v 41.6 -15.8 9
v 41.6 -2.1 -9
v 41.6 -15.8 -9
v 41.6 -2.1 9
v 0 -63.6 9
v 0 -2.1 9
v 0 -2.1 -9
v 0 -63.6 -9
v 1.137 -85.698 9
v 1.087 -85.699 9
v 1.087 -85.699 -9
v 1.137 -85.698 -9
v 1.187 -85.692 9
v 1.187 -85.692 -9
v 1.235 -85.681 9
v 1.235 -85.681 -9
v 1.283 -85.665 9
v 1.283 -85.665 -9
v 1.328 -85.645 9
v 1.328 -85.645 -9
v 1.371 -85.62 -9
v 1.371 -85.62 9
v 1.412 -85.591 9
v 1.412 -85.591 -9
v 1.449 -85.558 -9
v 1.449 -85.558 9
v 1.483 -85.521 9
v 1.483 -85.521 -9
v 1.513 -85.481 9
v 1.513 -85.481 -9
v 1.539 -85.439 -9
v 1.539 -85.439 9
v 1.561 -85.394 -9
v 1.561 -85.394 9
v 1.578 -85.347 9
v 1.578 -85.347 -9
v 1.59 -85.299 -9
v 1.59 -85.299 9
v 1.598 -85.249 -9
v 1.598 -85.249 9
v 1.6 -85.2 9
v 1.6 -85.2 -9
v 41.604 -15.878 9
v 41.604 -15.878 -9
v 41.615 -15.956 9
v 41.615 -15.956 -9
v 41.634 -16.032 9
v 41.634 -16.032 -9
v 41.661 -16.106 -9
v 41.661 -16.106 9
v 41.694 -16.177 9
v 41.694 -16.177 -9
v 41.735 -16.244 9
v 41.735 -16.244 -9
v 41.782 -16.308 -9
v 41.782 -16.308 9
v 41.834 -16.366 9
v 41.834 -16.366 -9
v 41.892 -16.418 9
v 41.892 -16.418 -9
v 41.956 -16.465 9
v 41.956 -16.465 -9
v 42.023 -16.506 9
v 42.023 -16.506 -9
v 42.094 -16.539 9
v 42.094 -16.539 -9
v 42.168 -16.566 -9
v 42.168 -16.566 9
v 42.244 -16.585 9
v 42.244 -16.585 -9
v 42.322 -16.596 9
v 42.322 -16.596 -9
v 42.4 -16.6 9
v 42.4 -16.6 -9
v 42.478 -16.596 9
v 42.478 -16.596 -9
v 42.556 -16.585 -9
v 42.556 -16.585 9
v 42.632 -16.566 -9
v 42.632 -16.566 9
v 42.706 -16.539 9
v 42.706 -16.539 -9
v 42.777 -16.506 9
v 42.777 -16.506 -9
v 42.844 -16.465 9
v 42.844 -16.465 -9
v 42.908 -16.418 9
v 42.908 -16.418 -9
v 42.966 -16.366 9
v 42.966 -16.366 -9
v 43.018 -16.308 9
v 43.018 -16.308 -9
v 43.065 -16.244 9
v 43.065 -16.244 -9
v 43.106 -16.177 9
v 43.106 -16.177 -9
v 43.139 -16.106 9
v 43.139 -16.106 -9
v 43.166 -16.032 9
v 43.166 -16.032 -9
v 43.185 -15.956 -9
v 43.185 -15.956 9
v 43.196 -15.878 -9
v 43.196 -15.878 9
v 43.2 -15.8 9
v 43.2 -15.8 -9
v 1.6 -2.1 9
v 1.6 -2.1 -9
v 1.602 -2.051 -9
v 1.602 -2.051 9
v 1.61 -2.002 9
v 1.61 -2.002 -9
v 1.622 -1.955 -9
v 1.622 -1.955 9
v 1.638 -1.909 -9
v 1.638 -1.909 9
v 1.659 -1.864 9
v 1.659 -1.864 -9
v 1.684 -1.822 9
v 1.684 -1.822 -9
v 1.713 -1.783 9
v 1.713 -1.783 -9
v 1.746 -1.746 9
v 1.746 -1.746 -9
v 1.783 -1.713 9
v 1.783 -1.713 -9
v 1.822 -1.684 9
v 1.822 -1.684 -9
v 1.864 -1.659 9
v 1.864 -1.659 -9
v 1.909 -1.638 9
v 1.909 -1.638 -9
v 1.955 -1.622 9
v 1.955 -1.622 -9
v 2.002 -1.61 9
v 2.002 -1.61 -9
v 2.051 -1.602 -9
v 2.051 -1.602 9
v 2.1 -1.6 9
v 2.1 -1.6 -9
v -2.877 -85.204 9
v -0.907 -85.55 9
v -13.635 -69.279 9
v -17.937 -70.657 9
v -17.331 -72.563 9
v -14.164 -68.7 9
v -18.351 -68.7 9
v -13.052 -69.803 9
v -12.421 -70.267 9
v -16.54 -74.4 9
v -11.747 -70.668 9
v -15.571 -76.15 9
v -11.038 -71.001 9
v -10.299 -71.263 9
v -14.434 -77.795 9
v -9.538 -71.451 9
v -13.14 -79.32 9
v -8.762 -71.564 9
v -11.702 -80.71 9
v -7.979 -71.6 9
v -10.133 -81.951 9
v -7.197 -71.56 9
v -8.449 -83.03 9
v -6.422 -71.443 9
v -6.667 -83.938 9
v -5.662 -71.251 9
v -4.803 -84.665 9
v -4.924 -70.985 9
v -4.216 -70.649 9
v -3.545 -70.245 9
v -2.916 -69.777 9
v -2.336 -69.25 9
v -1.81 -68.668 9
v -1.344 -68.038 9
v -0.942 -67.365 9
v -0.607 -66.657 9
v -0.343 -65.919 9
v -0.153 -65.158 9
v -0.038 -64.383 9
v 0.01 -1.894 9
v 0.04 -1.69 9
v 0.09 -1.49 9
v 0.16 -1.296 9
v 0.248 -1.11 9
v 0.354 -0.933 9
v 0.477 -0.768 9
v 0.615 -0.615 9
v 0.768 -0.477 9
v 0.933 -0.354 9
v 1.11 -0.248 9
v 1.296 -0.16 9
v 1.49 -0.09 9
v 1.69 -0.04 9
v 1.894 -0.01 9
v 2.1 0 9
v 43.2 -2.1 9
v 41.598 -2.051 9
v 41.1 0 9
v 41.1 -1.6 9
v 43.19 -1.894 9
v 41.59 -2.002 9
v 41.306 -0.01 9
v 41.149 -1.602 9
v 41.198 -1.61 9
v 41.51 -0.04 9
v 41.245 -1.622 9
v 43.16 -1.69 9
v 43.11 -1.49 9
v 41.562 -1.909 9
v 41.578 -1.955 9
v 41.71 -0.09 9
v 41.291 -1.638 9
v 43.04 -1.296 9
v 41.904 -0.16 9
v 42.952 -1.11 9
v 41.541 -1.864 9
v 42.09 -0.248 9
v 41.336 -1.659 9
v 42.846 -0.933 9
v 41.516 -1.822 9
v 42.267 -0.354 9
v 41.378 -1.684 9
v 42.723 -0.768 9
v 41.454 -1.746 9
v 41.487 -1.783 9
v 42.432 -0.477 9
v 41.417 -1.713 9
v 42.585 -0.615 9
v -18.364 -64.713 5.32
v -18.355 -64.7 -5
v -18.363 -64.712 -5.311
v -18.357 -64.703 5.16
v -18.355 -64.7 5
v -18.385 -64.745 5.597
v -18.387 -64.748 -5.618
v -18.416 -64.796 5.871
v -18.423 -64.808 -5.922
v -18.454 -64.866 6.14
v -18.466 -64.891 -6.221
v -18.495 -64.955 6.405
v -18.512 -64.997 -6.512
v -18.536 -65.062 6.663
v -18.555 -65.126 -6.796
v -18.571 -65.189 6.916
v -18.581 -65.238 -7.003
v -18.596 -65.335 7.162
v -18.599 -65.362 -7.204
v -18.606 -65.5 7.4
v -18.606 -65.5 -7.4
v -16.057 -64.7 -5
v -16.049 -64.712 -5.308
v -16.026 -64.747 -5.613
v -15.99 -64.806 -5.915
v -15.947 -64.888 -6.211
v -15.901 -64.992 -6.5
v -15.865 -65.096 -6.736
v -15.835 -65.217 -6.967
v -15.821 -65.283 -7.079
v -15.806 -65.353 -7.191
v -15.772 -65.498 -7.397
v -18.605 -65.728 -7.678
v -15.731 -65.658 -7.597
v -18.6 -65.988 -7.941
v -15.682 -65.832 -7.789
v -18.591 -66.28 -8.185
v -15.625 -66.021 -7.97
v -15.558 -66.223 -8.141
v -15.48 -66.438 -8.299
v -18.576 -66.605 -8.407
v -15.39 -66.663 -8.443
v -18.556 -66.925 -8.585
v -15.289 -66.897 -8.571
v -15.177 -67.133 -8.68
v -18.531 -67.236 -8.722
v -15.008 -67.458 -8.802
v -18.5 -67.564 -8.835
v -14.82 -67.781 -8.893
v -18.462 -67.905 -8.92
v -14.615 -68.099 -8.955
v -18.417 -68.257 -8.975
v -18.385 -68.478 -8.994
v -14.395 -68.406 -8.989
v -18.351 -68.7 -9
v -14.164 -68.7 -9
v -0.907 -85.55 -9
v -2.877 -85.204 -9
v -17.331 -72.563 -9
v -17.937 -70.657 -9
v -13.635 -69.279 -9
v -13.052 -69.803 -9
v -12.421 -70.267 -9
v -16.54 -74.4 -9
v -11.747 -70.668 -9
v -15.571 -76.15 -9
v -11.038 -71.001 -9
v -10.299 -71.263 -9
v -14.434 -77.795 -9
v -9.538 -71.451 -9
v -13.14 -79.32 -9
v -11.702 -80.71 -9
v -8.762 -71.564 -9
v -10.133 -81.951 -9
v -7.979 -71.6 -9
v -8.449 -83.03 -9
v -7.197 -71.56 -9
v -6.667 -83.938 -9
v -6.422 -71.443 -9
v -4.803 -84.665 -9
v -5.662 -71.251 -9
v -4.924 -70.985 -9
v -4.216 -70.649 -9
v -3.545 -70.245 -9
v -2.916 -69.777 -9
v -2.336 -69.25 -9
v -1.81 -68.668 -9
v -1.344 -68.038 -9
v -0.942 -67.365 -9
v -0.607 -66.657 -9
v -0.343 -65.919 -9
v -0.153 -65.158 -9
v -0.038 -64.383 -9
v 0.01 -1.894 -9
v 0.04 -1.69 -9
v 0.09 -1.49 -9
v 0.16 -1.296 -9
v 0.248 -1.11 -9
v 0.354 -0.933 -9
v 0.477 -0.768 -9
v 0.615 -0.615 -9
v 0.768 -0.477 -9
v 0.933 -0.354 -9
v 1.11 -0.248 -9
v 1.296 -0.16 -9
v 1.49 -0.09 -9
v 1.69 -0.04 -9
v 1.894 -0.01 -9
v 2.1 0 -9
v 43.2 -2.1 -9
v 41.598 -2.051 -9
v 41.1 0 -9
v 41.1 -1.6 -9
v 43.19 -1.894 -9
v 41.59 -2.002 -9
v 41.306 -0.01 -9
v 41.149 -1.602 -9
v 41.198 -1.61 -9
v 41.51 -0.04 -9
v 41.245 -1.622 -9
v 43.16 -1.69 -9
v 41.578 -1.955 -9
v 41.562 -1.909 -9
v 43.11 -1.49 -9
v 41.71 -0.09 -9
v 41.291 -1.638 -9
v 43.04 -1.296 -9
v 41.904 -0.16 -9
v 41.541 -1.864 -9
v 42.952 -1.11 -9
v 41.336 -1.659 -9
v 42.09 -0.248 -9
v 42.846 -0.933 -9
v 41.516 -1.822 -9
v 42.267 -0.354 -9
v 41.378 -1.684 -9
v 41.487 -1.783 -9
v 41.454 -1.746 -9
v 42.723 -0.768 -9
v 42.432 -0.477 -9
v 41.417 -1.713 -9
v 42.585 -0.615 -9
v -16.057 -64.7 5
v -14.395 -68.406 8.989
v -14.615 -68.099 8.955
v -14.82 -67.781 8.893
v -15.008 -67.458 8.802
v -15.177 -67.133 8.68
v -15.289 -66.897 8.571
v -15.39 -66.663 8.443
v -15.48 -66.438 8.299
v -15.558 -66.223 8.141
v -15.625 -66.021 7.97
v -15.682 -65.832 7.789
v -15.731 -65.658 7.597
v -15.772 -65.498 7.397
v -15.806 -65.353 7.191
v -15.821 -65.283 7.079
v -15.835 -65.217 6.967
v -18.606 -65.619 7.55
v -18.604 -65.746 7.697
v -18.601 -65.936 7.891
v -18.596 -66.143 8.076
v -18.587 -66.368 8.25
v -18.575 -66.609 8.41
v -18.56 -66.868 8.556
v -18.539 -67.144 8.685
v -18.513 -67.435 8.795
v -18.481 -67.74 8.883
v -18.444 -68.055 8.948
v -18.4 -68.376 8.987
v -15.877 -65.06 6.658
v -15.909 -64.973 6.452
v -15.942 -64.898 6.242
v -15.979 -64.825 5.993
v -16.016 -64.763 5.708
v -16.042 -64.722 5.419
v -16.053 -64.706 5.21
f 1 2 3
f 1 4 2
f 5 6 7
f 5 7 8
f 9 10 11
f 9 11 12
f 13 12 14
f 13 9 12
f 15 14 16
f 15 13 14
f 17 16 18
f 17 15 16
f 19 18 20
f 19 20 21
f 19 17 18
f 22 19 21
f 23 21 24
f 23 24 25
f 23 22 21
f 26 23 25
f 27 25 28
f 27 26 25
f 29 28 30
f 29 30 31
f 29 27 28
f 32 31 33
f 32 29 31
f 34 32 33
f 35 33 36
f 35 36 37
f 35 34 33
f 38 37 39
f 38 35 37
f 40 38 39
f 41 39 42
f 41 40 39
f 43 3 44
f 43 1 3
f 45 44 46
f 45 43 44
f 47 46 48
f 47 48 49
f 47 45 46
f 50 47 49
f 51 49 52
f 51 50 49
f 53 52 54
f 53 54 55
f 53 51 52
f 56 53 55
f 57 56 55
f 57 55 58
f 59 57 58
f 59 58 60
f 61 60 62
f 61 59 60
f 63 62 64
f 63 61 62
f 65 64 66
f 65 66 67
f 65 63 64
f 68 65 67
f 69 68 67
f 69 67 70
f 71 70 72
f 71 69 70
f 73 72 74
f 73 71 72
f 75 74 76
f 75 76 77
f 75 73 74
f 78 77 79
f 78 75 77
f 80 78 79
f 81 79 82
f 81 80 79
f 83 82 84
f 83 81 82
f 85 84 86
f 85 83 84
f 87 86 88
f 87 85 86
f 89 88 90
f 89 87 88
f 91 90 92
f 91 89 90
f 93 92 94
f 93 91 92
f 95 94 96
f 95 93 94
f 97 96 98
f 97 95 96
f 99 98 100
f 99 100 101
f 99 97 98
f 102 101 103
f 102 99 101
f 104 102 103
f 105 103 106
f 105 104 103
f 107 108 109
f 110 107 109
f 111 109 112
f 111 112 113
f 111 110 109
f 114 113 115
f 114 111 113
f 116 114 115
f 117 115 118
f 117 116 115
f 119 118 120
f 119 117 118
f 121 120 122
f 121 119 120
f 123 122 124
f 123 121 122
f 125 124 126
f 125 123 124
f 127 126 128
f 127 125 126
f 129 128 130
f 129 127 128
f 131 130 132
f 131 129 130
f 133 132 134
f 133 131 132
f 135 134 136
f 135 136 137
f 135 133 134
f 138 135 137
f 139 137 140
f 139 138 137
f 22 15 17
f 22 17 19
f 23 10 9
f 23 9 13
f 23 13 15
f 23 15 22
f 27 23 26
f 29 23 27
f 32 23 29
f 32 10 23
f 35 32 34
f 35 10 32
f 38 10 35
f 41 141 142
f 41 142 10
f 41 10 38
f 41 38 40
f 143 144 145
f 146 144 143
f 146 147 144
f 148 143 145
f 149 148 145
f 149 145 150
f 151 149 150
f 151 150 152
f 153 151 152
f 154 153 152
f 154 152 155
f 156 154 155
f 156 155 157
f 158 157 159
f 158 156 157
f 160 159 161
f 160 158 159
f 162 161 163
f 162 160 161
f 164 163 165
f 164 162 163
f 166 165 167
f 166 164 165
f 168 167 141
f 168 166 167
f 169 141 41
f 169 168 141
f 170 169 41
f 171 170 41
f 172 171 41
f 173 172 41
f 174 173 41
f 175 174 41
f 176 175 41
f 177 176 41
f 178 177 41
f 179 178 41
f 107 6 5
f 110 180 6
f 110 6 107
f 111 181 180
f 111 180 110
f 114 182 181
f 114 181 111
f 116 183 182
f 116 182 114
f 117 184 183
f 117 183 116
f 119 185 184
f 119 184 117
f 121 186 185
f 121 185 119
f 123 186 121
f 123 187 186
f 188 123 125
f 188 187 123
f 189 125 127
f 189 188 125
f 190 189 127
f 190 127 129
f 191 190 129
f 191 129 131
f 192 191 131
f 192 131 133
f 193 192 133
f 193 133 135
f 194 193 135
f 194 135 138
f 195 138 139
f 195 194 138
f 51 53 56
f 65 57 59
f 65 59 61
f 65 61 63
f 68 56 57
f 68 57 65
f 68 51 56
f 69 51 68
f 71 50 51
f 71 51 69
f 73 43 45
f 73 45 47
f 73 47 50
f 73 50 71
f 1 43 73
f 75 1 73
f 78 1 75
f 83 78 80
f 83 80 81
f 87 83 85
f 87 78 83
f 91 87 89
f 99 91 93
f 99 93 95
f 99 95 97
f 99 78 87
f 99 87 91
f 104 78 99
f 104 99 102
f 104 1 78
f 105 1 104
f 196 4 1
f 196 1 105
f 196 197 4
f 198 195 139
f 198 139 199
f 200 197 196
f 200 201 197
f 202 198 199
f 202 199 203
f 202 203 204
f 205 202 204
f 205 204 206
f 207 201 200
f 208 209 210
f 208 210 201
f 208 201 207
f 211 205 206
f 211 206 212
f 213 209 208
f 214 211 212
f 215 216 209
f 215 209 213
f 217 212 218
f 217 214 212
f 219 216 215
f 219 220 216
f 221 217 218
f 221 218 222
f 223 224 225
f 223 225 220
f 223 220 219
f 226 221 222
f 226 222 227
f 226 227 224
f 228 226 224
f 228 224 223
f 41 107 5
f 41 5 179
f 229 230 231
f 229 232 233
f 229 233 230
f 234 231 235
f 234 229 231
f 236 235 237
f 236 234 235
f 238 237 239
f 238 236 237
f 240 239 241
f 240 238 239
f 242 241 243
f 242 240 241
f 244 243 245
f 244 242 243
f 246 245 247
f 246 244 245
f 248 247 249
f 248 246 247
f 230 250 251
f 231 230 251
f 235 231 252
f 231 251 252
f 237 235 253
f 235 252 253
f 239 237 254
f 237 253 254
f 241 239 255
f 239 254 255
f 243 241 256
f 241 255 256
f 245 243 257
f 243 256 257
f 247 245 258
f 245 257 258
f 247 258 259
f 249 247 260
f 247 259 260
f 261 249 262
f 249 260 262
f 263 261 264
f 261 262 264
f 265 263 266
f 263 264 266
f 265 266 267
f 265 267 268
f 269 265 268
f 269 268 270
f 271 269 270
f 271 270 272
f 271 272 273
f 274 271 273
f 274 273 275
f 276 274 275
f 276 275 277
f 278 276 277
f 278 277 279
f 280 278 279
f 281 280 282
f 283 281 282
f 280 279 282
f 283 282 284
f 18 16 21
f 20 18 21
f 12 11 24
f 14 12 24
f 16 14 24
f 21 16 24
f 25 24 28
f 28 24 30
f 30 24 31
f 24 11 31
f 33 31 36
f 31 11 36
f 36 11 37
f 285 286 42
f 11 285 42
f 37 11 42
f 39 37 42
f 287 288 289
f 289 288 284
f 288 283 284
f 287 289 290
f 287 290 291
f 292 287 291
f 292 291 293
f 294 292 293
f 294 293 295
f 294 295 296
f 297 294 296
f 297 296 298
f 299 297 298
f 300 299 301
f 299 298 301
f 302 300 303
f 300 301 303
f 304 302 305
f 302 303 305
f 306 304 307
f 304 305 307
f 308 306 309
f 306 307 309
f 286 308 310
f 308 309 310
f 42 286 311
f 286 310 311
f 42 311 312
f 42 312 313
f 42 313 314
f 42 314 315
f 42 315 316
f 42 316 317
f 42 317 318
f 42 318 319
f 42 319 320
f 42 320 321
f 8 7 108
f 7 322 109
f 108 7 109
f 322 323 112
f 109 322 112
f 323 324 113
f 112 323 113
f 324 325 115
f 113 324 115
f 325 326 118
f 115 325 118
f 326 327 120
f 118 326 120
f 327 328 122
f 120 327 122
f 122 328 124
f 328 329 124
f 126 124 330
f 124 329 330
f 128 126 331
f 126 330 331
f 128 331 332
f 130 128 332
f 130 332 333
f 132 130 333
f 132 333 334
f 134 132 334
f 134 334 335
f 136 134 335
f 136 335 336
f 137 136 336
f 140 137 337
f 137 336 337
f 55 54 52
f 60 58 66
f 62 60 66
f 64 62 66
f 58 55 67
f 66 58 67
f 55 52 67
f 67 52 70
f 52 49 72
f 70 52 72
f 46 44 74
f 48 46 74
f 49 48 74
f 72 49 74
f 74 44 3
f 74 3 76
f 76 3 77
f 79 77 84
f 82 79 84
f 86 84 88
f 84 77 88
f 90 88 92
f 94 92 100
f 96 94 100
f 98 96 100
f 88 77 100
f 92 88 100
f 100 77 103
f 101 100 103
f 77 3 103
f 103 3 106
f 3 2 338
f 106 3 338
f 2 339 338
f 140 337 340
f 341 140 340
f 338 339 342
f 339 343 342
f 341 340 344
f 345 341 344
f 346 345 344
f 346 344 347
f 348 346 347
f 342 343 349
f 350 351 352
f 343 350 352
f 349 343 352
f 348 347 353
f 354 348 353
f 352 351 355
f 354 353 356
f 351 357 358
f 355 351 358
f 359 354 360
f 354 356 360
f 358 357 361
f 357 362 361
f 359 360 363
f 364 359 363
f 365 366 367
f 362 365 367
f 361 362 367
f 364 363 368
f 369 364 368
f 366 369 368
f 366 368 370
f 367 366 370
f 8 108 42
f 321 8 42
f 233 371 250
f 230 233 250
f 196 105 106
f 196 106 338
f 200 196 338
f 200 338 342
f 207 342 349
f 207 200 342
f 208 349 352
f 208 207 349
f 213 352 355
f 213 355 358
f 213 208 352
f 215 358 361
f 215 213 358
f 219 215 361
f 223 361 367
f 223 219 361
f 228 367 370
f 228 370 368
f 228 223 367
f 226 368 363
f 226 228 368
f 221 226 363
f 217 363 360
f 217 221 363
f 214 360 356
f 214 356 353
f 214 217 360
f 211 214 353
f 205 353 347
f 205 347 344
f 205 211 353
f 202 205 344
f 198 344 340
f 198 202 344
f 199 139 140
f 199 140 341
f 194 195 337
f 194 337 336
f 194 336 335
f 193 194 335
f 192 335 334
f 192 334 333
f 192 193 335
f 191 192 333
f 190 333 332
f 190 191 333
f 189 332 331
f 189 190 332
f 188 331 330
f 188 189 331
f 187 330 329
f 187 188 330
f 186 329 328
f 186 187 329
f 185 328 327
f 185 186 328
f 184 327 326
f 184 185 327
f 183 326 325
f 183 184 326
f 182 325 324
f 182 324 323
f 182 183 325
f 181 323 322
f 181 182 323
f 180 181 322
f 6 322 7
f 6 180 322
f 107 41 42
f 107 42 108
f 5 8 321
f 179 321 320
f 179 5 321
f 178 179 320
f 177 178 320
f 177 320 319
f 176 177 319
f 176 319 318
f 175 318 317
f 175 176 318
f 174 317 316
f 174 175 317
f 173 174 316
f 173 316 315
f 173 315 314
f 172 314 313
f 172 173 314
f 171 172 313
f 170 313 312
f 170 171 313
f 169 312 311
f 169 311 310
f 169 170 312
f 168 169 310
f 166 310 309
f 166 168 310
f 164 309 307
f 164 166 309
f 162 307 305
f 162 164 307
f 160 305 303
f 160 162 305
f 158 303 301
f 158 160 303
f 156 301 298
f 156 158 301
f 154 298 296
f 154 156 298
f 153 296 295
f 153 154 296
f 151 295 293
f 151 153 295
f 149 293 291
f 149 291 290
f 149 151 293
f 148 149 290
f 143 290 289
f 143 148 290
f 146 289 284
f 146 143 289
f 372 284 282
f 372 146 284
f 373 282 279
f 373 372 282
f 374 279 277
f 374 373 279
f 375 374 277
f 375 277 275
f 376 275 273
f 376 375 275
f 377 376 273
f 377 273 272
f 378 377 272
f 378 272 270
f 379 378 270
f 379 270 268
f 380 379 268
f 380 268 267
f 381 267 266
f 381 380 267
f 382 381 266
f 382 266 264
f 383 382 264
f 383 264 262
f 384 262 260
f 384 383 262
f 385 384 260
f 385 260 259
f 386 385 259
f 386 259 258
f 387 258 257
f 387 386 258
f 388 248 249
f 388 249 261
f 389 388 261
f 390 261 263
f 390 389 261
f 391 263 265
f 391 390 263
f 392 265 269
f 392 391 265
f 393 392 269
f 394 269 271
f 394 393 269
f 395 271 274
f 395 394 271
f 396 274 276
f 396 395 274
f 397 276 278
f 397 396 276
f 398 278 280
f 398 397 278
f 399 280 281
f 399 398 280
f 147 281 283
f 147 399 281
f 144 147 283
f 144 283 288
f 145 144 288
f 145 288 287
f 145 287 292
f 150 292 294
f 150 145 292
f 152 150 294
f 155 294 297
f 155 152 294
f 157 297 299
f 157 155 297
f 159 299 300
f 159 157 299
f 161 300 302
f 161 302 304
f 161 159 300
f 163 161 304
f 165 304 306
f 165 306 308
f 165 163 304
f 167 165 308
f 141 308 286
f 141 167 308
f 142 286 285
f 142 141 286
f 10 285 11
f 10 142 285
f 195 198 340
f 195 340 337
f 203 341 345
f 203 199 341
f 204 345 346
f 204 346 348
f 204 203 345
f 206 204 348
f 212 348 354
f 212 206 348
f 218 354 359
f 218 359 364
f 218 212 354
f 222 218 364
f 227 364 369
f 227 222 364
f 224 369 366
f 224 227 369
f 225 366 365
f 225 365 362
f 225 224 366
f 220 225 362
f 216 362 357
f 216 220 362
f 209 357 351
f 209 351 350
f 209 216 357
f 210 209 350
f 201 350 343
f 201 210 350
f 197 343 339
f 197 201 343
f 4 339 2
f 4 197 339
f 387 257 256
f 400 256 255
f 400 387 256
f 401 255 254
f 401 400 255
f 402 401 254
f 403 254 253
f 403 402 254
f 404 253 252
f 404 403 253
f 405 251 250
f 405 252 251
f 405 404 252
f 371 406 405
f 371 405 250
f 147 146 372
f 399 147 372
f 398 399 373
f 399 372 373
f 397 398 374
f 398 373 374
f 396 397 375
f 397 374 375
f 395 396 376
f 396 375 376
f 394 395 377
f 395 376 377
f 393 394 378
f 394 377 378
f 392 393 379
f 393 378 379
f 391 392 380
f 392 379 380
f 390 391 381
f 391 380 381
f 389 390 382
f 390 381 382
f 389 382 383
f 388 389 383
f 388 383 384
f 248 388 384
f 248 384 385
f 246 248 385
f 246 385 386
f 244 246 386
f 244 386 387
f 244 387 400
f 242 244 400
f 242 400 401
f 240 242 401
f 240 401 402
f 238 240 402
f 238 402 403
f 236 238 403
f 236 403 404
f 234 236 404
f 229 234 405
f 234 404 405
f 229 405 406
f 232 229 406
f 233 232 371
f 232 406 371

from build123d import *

# Parameters (mm, degrees)
F1_DEPTH = 9
F3_START = -10
F3_DEPTH = 20


with BuildPart() as f1:
    # F0 (on Top) → F1 (new body, symmetric)
    with BuildSketch(Plane.XY):
        with BuildLine():
            ThreePointArc((41.6, -15.8), (42.4, -16.6), (43.2, -15.8))
            Line((43.2, -15.8), (43.2, -2.1))
            ThreePointArc((43.2, -2.1), (42.5849242405, -0.6150757595), (41.1, 0))
            Line((41.1, 0), (2.1, 0))
            ThreePointArc((2.1, 0), (0.6150757595, -0.6150757595), (0, -2.1))
            Line((0, -2.1), (0, -63.6))
            ThreePointArc((0, -63.6), (-7.1872847082, -71.5586113019), (-15.8348734636, -65.2170212766))
            ThreePointArc((-15.8348734636, -65.2170212766), (-17.3482014958, -64.1072430222), (-18.6059763198, -65.5))
            ThreePointArc((-18.6059763198, -65.5), (-12.8679094974, -79.60535621), (1.0873134933, -85.6994710718))
            ThreePointArc((1.0873134933, -85.6994710718), (1.4490392146, -85.5576426968), (1.6, -85.1996320452))
            Line((1.6, -85.1996320452), (1.6, -2.1))
            ThreePointArc((1.6, -2.1), (1.7464466094, -1.7464466094), (2.1, -1.6))
            Line((2.1, -1.6), (41.1, -1.6))
            ThreePointArc((41.1, -1.6), (41.4535533906, -1.7464466094), (41.6, -2.1))
            Line((41.6, -2.1), (41.6, -15.8))
        make_face()
    extrude(amount=F1_DEPTH, both=True)

    # F2 (on Right) → F3 (cut)
    with BuildSketch(Plane.YZ.offset(F3_START)):
        with BuildLine():
            ThreePointArc((-64.7, -5), (-65.8715728753, -7.8284271247), (-68.7, -9))
            Line((-68.7, -9), (-68.7, -10))
            Line((-68.7, -10), (-63.7, -10))
            Line((-63.7, -10), (-63.7, 10))
            Line((-63.7, 10), (-68.7, 10))
            Line((-68.7, 10), (-68.7, 9))
            ThreePointArc((-68.7, 9), (-65.8715728753, 7.8284271247), (-64.7, 5))
            Line((-64.7, 5), (-64.7, -5))
        make_face()
    extrude(amount=-F3_DEPTH, mode=Mode.SUBTRACT)


solid = f1.part
